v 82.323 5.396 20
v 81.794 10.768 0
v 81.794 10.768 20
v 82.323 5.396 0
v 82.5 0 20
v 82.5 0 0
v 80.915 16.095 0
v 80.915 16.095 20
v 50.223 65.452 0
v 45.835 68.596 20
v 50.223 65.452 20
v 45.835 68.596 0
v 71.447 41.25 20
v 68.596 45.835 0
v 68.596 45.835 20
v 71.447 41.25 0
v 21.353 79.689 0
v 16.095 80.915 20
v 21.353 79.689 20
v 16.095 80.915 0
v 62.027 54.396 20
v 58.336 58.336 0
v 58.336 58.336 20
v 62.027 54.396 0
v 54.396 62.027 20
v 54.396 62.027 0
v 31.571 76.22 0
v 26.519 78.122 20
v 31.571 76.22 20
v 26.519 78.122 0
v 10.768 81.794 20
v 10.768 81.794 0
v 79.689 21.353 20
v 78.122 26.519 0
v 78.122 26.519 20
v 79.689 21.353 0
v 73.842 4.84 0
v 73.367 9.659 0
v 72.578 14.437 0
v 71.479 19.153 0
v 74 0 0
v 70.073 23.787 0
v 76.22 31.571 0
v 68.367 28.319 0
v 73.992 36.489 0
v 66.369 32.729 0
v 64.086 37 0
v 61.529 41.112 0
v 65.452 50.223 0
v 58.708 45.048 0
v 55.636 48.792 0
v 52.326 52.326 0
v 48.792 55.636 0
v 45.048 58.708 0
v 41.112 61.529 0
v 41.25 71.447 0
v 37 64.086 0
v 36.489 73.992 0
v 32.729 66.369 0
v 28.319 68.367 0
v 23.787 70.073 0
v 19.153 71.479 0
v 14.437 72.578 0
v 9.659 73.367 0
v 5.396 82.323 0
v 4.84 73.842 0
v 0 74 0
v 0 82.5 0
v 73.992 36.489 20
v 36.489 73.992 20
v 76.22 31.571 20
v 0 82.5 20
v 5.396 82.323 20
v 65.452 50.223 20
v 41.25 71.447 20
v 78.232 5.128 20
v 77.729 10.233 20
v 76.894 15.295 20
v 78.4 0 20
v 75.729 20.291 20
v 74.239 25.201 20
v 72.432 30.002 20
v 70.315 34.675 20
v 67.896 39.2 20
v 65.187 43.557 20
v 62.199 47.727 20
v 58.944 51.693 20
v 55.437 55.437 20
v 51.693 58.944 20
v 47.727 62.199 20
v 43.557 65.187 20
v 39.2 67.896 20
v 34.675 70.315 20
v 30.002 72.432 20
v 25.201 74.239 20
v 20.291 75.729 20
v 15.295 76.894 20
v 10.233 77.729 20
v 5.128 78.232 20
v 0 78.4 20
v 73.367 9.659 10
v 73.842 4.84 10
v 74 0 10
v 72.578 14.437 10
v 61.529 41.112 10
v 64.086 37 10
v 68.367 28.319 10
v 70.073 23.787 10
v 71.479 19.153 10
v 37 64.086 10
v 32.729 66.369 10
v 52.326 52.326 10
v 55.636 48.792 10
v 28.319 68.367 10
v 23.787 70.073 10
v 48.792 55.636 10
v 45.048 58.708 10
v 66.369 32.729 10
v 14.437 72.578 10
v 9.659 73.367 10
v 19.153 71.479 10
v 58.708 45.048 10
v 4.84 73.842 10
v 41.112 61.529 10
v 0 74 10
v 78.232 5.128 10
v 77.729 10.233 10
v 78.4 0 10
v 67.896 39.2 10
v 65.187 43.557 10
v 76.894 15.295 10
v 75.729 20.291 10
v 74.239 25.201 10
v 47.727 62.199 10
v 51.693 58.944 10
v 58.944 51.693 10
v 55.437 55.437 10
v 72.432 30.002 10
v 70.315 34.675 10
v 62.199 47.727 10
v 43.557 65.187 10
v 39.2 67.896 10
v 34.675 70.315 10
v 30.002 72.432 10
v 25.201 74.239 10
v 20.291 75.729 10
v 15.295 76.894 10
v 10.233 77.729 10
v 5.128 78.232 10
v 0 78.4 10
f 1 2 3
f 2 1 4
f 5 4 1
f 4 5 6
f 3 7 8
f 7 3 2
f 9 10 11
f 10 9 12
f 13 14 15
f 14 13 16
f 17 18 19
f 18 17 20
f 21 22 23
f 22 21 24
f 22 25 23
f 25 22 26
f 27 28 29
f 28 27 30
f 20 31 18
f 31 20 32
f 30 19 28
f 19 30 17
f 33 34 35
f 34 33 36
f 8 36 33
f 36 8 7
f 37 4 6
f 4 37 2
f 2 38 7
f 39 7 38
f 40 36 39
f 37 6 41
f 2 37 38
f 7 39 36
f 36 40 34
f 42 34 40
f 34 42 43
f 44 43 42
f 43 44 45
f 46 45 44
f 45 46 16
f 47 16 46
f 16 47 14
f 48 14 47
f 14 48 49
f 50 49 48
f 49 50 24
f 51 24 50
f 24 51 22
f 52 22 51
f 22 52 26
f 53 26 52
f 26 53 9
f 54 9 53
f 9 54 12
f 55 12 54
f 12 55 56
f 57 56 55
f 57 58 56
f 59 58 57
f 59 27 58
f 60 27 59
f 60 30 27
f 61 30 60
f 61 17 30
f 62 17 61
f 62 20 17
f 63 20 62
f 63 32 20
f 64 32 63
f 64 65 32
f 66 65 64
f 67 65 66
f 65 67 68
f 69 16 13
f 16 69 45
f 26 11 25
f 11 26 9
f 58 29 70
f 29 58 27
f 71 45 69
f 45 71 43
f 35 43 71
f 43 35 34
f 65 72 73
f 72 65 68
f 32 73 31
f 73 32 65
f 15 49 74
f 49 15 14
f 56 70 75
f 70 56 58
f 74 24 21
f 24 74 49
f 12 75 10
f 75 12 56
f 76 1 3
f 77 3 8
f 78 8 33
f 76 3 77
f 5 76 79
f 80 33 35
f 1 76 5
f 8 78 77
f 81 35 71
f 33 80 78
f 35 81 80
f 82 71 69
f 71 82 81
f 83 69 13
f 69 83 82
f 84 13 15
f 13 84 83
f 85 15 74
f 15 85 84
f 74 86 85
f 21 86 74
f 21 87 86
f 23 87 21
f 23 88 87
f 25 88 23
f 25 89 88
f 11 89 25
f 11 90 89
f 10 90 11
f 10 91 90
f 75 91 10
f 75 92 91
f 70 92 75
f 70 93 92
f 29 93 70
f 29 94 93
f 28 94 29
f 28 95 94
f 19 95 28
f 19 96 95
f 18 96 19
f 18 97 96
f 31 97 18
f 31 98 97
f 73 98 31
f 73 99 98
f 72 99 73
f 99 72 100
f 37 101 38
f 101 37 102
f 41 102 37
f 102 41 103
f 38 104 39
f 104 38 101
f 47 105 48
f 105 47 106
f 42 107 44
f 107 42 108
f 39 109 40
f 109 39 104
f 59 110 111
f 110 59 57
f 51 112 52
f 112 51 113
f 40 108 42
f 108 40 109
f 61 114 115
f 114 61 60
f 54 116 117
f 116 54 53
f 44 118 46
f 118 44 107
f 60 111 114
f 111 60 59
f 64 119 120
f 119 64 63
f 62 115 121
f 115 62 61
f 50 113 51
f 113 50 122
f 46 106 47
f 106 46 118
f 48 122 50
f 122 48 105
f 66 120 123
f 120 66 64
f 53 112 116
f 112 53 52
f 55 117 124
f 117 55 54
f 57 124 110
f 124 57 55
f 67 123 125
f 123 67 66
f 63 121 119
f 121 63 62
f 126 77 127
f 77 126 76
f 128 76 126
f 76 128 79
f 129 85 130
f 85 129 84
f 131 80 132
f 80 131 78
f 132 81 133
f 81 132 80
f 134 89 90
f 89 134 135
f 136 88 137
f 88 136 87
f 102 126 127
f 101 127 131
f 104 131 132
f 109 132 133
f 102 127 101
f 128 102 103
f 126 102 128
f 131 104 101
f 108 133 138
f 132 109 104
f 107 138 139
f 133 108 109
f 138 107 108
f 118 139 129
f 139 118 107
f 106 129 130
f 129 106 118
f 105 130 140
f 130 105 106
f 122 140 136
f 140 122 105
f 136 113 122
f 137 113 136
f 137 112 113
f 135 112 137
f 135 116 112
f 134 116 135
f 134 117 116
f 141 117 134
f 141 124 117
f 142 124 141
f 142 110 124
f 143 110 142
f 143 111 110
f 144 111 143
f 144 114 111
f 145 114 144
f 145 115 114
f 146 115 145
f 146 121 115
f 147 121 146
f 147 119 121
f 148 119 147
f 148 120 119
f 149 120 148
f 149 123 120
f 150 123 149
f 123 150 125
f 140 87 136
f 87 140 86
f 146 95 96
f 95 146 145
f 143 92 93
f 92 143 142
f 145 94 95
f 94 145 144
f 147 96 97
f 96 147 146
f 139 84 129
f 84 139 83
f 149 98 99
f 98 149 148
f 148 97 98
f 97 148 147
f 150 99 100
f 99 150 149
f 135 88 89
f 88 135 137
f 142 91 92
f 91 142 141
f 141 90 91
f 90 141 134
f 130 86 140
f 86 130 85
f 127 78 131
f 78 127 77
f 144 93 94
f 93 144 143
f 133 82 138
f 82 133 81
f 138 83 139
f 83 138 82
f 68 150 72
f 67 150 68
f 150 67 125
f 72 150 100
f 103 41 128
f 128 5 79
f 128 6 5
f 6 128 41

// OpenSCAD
// file: electronics_mount.scad
include <params.scad>

// 電子部品を格納する箱（マウント）全体を生成するモジュール
module electronics_box() {
    translate([body_outer_d / 2 - electronics_box_d / 2, 0, electronics_box_h / 2])
        union() {
            // 外箱の直方体から、内部の空洞（キャビティ）をくり抜く
            difference() {
                cube([electronics_box_d, electronics_box_w, electronics_box_h], center = true);
                // 底面と、円筒側の壁だけを消して、反対側の壁は残す。
                translate([-wall / 2, 0, -wall / 2])
                    cube([
                        electronics_box_d + wall,
                        electronics_box_w - wall * 2,
                        electronics_box_h + wall
                    ], center = true);
            }
            electronics_pcb_mount_local();
        }
}

module electronics_pcb_mount_local() {
    // Parameters（各種サイズ設定）
    // test2.scad の構成をベースに、電装室内へ収まる寸法に調整する。
    table_width = 32;      // テーブルの幅 (X軸方向)
    table_depth = electronics_box_w - (wall * 2);      // テーブルの奥行き (Y軸方向)
    table_height = 5.5;    // テーブル全体の高さ (Z軸方向)
    pcb_width = table_width;       // 基盤の幅 (X軸方向)
    pcb_depth = 32;                // 基盤の奥行き (Y軸方向)
    leg_size = 6;                  // 脚の太さ (X, Y軸方向)
    top_thickness = 2;             // 天板の厚み (Z軸方向)
    wall_thickness = 3;            // 壁の厚み
    wall_height = electronics_box_h;              // 壁の高さ (Z軸方向)
    pcb_y_offset = table_depth - pcb_depth;

    // Legs（脚のモジュール定義）
    module leg() {
        cube([leg_size, leg_size, table_height - top_thickness]);
    }

    // test2.scad のレイアウトを、箱の中心に収まるように寄せる。
    // 底面に直接置く。wall 分だけ持ち上げていた高さオフセットを外す。
    translate([-table_width / 2, -table_depth / 2, -electronics_box_h / 2]) {
        // Table Top（天板の描画）
        difference() {
            cube([pcb_width, table_depth, top_thickness]);
        }

        // Position the four legs（4本の脚を四隅に配置）
        translate([0, table_depth - (pcb_width), top_thickness]) leg();
        translate([pcb_width - leg_size, table_depth - (pcb_width), top_thickness]) leg();
        translate([0, table_depth - leg_size, top_thickness]) leg();
        translate([pcb_width - leg_size, table_depth - leg_size, top_thickness]) leg();

        // Left Wall（左の壁）
        translate([table_width, -wall_thickness, 0])
            difference() {
                difference() {
                    hole_depth = 7.6;       // 壁に開ける穴の奥行き (Y軸方向)
                    hole_height = 10.5;      // 壁に開ける穴の高さ (Z軸方向)
                    cube([wall_thickness, table_depth + (wall_thickness * 2), wall_height]);
                    move_depth = 13.4 + wall_thickness; // 穴の位置を壁からどれだけ離すか
                    translate([-0.1, table_depth - move_depth, table_height + 1.0])
                        cube([wall_thickness + 0.2, hole_depth, hole_height]);
                }
                x = 0;
                y = 20;
                z = 14;
                r = 4.6;
                translate([x, y, z])
                    sphere(r);
        }

        // Back Wall（奥の壁）
        translate([-wall_thickness, table_depth, 0])
            cube([table_width + wall_thickness, wall_thickness, wall_height]);

        // Front Wall（手前の壁）
        translate([-wall_thickness, -wall_thickness, 0])
            cube([table_width + wall_thickness, wall_thickness, wall_height]);
    }
}
// file: vents.scad
include <params.scad>

module side_vents(radius = body_outer_d / 2, center_z = vent_center_z) {
    for (i = [0 : vent_count - 1]) {
        rotate([0, 0, i * 360 / vent_count])
            translate([radius, 0, center_z])
                for (row = [0 : vent_rows - 1]) {
                    translate([0, 0, (row - (vent_rows - 1) / 2) * vent_row_pitch])
                        cube([wall * 4, vent_slot_w, vent_slot_h], center = true);
                }
    }
}
// file: fan_mount.scad
include <params.scad>

module fan_screw_holes(h = 10) {
    for (x = [-fan_hole_pitch / 2, fan_hole_pitch / 2]) {
        for (y = [-fan_hole_pitch / 2, fan_hole_pitch / 2]) {
            translate([x, y, 0])
                cylinder(h = h, d = fan_screw_d, center = true);
        }
    }
}

module fan_cutout(h = 10) {
    cylinder(h = h, d = fan_cutout_d, center = true);
}
// file: top_ring.scad
include <params.scad>

module top_ring() {
    difference() {
        cylinder(h = top_ring_h, d = body_outer_d);

        // Main airflow opening. The metal sieve ring sits on the remaining ledge.
        translate([0, 0, -1])
            cylinder(h = top_ring_h + 2, d = sieve_opening_d);

        // Shallow upper pocket for the sieve's attached metal outer ring.
        translate([0, 0, top_ring_h - sieve_ring_seat_depth])
            cylinder(h = sieve_ring_seat_depth + 1, d = sieve_ring_seat_d);

    }
}

top_ring();
// file: plenum.scad
include <params.scad>

module plenum() {
    difference() {
        cylinder(h = plenum_h, d = body_outer_d);

        translate([0, 0, wall])
            cylinder(h = plenum_h, d = body_outer_d - wall * 2);

        translate([0, 0, -1])
            cylinder(h = wall + 2, d = fan_cutout_d);
    }
}

plenum();
// file: base.scad
include <params.scad>
use <fan_mount.scad>
use <vents.scad>
use <electronics_mount.scad>

// ファン室の内側をくり抜く切り欠き。
// ここではベース円筒の内部空間だけを取り除く。
module exhaust_chamber_cutout() {
    chamber_h = base_h - fan_plate_thickness + 1.2;
    translate([0, 0, -0.6 + chamber_h / 2])
        cylinder(h = chamber_h, d = body_outer_d - wall * 2, center = true);
}

// ファン取付プレートに開ける開口とネジ穴。
module fan_plate_cutouts() {
    translate([0, 0, base_h - fan_plate_thickness / 2])
        fan_cutout(fan_plate_thickness + 2);

    translate([0, 0, base_h - fan_plate_thickness / 2])
        fan_screw_holes(fan_plate_thickness + 2);
}

// ファン開口まわりのシール用リップ。
module fan_seal_lip() {
    translate([0, 0, base_h - fan_plate_thickness - fan_seal_lip_h])
        difference() {
            cylinder(h = fan_seal_lip_h, d = fan_cutout_d + fan_seal_lip_w * 2);
            translate([0, 0, -0.1])
                cylinder(h = fan_seal_lip_h + 0.2, d = fan_cutout_d);
        }
}

// 電装箱が円柱本体に食い込む部分を先に抜いておく。
// これを入れないと、箱の接続部に円柱の壁が残ってしまう。
module electronics_box_cutout() {
    translate([body_outer_d / 2 - electronics_box_d / 2, 0, electronics_box_h / 2])
        cube([
            // electronics_box_d + clearance * 2,
            // electronics_box_w + clearance * 2,
            // electronics_box_h + clearance * 2
            electronics_box_d,
            electronics_box_w,
            electronics_box_h - 2
        ], center = true);
}

// ベース本体。
// 円柱本体を土台にして、電装箱を張り出しとして追加する。
module base() {
    union() {
        difference() {
            cylinder(h = base_h, d = body_outer_d);

            exhaust_chamber_cutout();
            fan_plate_cutouts();
            side_vents();
            electronics_box_cutout();
        }

        electronics_box();
        fan_seal_lip();
    }
}

base();
// file: params.scad
// ==========================================
// Coffee Cooler Parameters / コーヒークーラー共通パラメータ
// ==========================================

// --- Global Settings / 全体設定 ---
$fn = 96;           // Rendering resolution / 円や曲面の分割数
wall = 3;           // Standard wall thickness / 標準の壁厚
clearance = 0.4;    // General mechanical clearance / 嵌合や穴用の基本クリアランス

// --- Main Body Sections / 本体の主要寸法 ---
body_outer_d = 165;  // Outer diameter of the main cylindrical body / 本体円筒部の外径
top_ring_h = 20;     // Height of the top ring that holds the sieve / ザル受け上部リングの高さ
plenum_h = 45;       // Height of the air plenum section / ザル下の整流空間の高さ
base_h = 80;         // Height of the base section (housing the fan) / ファンを収めるベース部の高さ

// --- Sieve & Gasket (Top Section) / ザルとガスケット ---
// Parameters for the coffee sieve/filter / コーヒー用うらごしザルの寸法
sieve_ring_outer_d = 156;                 // ザル付属金属リングの外径
sieve_outer_d = sieve_ring_outer_d;       // mock表示用のザル外径。実寸基準はsieve_ring_outer_d
sieve_h = 55;                             // ザル全体の高さ
sieve_ring_seat_d = sieve_ring_outer_d + 0.8;  // top_ring側のザル受けポケット径
sieve_ring_seat_depth = 10;               // ザル受けポケットの深さ
sieve_opening_d = 148;                    // top_ring中央の吸気開口径
sieve_loop_relief_w = 30;                 // 未使用: ザル横リング逃げの幅
sieve_loop_relief_d = 7;                  // 未使用: ザル横リング逃げの奥行き
sieve_loop_relief_h = 12;                 // 未使用: ザル横リング逃げの高さ
sieve_seat_d = sieve_ring_seat_d;         // 互換用: ザル受け径
sieve_lip_h = sieve_ring_seat_depth;      // 互換用: ザル受けリップ高さ

// Gasket parameters (intended for TPU printing) / TPUガスケット寸法
gasket_outer_d = sieve_ring_seat_d - 0.4;  // TPUガスケットの外径
gasket_inner_d = sieve_opening_d + 1.0;    // TPUガスケットの内径
gasket_h = 1.2;                            // TPUガスケットの厚み
gasket_loop_relief_w = sieve_loop_relief_w + 2;  // 未使用: 旧切り欠き用の幅
gasket_loop_relief_d = sieve_loop_relief_d + 1;  // 未使用: 旧切り欠き用の奥行き

// --- Fan & Mount / 120mmファンと固定部 ---
// Standard 120mm fan parameters / 一般的な120mm PCファン寸法
fan_size = 120;              // ファン外形サイズ
fan_clearance = 1.0;         // ファン外形まわりの逃げ
fan_cutout_d = 113;          // ファン開口径
fan_hole_pitch = 105;        // ファン固定穴ピッチ
fan_screw_d = 4.5;           // ファン固定ネジの通し穴径
fan_thickness = 25;          // ファン厚み
fan_plate_thickness = 4;     // ファン取付プレートの厚み
fan_seal_lip_h = 2;          // ファン開口まわりのシールリップ高さ
fan_seal_lip_w = 7;          // ファン開口まわりのシールリップ幅

// --- Ventilation Slots / 側面排気スリット ---
// Air exhaust slots on the base / ベース側面の排気口寸法
vent_slot_w = 34;       // 排気スリットの横幅
vent_slot_h = 9;        // 排気スリットの高さ
vent_row_pitch = vent_slot_h + 6;  // 排気スリットの段間ピッチ
vent_rows = 4;          // 排気スリットの段数
vent_count = 8;         // 円周方向の排気スリット数
vent_center_z = base_h / 2;  // 排気スリット群の中心高さ

// --- Electronics Bay / 電装室 ---
// Internal space for PWM controller and DC barrel jack. / PWMコントローラとDC電源ジャックの収納部
electronics_box_d = 32;  // 電装室の奥行き
electronics_box_w = 80;  // 電装室の幅
electronics_box_h = 45;  // 電装室の高さ
// main file
include <params.scad>
use <base.scad>
use <plenum.scad>
use <top_ring.scad>

part = "top_ring";
quadrant = "ne";

module selected_part() {
    if (part == "top_ring") {
        top_ring();
    } else if (part == "plenum") {
        plenum();
    } else if (part == "base") {
        base();
    }
}

module quadrant_clip(q = "ne") {
    clip_h = base_h + plenum_h + top_ring_h + 20;
    clip_xy = body_outer_d + electronics_box_d + 20;
    x = q == "ne" || q == "se" ? clip_xy / 2 : -clip_xy / 2;
    y = q == "ne" || q == "nw" ? clip_xy / 2 : -clip_xy / 2;

    translate([x, y, clip_h / 2])
        cube([clip_xy, clip_xy, clip_h], center = true);
}

intersection() {
    selected_part();
    quadrant_clip(quadrant);
}
